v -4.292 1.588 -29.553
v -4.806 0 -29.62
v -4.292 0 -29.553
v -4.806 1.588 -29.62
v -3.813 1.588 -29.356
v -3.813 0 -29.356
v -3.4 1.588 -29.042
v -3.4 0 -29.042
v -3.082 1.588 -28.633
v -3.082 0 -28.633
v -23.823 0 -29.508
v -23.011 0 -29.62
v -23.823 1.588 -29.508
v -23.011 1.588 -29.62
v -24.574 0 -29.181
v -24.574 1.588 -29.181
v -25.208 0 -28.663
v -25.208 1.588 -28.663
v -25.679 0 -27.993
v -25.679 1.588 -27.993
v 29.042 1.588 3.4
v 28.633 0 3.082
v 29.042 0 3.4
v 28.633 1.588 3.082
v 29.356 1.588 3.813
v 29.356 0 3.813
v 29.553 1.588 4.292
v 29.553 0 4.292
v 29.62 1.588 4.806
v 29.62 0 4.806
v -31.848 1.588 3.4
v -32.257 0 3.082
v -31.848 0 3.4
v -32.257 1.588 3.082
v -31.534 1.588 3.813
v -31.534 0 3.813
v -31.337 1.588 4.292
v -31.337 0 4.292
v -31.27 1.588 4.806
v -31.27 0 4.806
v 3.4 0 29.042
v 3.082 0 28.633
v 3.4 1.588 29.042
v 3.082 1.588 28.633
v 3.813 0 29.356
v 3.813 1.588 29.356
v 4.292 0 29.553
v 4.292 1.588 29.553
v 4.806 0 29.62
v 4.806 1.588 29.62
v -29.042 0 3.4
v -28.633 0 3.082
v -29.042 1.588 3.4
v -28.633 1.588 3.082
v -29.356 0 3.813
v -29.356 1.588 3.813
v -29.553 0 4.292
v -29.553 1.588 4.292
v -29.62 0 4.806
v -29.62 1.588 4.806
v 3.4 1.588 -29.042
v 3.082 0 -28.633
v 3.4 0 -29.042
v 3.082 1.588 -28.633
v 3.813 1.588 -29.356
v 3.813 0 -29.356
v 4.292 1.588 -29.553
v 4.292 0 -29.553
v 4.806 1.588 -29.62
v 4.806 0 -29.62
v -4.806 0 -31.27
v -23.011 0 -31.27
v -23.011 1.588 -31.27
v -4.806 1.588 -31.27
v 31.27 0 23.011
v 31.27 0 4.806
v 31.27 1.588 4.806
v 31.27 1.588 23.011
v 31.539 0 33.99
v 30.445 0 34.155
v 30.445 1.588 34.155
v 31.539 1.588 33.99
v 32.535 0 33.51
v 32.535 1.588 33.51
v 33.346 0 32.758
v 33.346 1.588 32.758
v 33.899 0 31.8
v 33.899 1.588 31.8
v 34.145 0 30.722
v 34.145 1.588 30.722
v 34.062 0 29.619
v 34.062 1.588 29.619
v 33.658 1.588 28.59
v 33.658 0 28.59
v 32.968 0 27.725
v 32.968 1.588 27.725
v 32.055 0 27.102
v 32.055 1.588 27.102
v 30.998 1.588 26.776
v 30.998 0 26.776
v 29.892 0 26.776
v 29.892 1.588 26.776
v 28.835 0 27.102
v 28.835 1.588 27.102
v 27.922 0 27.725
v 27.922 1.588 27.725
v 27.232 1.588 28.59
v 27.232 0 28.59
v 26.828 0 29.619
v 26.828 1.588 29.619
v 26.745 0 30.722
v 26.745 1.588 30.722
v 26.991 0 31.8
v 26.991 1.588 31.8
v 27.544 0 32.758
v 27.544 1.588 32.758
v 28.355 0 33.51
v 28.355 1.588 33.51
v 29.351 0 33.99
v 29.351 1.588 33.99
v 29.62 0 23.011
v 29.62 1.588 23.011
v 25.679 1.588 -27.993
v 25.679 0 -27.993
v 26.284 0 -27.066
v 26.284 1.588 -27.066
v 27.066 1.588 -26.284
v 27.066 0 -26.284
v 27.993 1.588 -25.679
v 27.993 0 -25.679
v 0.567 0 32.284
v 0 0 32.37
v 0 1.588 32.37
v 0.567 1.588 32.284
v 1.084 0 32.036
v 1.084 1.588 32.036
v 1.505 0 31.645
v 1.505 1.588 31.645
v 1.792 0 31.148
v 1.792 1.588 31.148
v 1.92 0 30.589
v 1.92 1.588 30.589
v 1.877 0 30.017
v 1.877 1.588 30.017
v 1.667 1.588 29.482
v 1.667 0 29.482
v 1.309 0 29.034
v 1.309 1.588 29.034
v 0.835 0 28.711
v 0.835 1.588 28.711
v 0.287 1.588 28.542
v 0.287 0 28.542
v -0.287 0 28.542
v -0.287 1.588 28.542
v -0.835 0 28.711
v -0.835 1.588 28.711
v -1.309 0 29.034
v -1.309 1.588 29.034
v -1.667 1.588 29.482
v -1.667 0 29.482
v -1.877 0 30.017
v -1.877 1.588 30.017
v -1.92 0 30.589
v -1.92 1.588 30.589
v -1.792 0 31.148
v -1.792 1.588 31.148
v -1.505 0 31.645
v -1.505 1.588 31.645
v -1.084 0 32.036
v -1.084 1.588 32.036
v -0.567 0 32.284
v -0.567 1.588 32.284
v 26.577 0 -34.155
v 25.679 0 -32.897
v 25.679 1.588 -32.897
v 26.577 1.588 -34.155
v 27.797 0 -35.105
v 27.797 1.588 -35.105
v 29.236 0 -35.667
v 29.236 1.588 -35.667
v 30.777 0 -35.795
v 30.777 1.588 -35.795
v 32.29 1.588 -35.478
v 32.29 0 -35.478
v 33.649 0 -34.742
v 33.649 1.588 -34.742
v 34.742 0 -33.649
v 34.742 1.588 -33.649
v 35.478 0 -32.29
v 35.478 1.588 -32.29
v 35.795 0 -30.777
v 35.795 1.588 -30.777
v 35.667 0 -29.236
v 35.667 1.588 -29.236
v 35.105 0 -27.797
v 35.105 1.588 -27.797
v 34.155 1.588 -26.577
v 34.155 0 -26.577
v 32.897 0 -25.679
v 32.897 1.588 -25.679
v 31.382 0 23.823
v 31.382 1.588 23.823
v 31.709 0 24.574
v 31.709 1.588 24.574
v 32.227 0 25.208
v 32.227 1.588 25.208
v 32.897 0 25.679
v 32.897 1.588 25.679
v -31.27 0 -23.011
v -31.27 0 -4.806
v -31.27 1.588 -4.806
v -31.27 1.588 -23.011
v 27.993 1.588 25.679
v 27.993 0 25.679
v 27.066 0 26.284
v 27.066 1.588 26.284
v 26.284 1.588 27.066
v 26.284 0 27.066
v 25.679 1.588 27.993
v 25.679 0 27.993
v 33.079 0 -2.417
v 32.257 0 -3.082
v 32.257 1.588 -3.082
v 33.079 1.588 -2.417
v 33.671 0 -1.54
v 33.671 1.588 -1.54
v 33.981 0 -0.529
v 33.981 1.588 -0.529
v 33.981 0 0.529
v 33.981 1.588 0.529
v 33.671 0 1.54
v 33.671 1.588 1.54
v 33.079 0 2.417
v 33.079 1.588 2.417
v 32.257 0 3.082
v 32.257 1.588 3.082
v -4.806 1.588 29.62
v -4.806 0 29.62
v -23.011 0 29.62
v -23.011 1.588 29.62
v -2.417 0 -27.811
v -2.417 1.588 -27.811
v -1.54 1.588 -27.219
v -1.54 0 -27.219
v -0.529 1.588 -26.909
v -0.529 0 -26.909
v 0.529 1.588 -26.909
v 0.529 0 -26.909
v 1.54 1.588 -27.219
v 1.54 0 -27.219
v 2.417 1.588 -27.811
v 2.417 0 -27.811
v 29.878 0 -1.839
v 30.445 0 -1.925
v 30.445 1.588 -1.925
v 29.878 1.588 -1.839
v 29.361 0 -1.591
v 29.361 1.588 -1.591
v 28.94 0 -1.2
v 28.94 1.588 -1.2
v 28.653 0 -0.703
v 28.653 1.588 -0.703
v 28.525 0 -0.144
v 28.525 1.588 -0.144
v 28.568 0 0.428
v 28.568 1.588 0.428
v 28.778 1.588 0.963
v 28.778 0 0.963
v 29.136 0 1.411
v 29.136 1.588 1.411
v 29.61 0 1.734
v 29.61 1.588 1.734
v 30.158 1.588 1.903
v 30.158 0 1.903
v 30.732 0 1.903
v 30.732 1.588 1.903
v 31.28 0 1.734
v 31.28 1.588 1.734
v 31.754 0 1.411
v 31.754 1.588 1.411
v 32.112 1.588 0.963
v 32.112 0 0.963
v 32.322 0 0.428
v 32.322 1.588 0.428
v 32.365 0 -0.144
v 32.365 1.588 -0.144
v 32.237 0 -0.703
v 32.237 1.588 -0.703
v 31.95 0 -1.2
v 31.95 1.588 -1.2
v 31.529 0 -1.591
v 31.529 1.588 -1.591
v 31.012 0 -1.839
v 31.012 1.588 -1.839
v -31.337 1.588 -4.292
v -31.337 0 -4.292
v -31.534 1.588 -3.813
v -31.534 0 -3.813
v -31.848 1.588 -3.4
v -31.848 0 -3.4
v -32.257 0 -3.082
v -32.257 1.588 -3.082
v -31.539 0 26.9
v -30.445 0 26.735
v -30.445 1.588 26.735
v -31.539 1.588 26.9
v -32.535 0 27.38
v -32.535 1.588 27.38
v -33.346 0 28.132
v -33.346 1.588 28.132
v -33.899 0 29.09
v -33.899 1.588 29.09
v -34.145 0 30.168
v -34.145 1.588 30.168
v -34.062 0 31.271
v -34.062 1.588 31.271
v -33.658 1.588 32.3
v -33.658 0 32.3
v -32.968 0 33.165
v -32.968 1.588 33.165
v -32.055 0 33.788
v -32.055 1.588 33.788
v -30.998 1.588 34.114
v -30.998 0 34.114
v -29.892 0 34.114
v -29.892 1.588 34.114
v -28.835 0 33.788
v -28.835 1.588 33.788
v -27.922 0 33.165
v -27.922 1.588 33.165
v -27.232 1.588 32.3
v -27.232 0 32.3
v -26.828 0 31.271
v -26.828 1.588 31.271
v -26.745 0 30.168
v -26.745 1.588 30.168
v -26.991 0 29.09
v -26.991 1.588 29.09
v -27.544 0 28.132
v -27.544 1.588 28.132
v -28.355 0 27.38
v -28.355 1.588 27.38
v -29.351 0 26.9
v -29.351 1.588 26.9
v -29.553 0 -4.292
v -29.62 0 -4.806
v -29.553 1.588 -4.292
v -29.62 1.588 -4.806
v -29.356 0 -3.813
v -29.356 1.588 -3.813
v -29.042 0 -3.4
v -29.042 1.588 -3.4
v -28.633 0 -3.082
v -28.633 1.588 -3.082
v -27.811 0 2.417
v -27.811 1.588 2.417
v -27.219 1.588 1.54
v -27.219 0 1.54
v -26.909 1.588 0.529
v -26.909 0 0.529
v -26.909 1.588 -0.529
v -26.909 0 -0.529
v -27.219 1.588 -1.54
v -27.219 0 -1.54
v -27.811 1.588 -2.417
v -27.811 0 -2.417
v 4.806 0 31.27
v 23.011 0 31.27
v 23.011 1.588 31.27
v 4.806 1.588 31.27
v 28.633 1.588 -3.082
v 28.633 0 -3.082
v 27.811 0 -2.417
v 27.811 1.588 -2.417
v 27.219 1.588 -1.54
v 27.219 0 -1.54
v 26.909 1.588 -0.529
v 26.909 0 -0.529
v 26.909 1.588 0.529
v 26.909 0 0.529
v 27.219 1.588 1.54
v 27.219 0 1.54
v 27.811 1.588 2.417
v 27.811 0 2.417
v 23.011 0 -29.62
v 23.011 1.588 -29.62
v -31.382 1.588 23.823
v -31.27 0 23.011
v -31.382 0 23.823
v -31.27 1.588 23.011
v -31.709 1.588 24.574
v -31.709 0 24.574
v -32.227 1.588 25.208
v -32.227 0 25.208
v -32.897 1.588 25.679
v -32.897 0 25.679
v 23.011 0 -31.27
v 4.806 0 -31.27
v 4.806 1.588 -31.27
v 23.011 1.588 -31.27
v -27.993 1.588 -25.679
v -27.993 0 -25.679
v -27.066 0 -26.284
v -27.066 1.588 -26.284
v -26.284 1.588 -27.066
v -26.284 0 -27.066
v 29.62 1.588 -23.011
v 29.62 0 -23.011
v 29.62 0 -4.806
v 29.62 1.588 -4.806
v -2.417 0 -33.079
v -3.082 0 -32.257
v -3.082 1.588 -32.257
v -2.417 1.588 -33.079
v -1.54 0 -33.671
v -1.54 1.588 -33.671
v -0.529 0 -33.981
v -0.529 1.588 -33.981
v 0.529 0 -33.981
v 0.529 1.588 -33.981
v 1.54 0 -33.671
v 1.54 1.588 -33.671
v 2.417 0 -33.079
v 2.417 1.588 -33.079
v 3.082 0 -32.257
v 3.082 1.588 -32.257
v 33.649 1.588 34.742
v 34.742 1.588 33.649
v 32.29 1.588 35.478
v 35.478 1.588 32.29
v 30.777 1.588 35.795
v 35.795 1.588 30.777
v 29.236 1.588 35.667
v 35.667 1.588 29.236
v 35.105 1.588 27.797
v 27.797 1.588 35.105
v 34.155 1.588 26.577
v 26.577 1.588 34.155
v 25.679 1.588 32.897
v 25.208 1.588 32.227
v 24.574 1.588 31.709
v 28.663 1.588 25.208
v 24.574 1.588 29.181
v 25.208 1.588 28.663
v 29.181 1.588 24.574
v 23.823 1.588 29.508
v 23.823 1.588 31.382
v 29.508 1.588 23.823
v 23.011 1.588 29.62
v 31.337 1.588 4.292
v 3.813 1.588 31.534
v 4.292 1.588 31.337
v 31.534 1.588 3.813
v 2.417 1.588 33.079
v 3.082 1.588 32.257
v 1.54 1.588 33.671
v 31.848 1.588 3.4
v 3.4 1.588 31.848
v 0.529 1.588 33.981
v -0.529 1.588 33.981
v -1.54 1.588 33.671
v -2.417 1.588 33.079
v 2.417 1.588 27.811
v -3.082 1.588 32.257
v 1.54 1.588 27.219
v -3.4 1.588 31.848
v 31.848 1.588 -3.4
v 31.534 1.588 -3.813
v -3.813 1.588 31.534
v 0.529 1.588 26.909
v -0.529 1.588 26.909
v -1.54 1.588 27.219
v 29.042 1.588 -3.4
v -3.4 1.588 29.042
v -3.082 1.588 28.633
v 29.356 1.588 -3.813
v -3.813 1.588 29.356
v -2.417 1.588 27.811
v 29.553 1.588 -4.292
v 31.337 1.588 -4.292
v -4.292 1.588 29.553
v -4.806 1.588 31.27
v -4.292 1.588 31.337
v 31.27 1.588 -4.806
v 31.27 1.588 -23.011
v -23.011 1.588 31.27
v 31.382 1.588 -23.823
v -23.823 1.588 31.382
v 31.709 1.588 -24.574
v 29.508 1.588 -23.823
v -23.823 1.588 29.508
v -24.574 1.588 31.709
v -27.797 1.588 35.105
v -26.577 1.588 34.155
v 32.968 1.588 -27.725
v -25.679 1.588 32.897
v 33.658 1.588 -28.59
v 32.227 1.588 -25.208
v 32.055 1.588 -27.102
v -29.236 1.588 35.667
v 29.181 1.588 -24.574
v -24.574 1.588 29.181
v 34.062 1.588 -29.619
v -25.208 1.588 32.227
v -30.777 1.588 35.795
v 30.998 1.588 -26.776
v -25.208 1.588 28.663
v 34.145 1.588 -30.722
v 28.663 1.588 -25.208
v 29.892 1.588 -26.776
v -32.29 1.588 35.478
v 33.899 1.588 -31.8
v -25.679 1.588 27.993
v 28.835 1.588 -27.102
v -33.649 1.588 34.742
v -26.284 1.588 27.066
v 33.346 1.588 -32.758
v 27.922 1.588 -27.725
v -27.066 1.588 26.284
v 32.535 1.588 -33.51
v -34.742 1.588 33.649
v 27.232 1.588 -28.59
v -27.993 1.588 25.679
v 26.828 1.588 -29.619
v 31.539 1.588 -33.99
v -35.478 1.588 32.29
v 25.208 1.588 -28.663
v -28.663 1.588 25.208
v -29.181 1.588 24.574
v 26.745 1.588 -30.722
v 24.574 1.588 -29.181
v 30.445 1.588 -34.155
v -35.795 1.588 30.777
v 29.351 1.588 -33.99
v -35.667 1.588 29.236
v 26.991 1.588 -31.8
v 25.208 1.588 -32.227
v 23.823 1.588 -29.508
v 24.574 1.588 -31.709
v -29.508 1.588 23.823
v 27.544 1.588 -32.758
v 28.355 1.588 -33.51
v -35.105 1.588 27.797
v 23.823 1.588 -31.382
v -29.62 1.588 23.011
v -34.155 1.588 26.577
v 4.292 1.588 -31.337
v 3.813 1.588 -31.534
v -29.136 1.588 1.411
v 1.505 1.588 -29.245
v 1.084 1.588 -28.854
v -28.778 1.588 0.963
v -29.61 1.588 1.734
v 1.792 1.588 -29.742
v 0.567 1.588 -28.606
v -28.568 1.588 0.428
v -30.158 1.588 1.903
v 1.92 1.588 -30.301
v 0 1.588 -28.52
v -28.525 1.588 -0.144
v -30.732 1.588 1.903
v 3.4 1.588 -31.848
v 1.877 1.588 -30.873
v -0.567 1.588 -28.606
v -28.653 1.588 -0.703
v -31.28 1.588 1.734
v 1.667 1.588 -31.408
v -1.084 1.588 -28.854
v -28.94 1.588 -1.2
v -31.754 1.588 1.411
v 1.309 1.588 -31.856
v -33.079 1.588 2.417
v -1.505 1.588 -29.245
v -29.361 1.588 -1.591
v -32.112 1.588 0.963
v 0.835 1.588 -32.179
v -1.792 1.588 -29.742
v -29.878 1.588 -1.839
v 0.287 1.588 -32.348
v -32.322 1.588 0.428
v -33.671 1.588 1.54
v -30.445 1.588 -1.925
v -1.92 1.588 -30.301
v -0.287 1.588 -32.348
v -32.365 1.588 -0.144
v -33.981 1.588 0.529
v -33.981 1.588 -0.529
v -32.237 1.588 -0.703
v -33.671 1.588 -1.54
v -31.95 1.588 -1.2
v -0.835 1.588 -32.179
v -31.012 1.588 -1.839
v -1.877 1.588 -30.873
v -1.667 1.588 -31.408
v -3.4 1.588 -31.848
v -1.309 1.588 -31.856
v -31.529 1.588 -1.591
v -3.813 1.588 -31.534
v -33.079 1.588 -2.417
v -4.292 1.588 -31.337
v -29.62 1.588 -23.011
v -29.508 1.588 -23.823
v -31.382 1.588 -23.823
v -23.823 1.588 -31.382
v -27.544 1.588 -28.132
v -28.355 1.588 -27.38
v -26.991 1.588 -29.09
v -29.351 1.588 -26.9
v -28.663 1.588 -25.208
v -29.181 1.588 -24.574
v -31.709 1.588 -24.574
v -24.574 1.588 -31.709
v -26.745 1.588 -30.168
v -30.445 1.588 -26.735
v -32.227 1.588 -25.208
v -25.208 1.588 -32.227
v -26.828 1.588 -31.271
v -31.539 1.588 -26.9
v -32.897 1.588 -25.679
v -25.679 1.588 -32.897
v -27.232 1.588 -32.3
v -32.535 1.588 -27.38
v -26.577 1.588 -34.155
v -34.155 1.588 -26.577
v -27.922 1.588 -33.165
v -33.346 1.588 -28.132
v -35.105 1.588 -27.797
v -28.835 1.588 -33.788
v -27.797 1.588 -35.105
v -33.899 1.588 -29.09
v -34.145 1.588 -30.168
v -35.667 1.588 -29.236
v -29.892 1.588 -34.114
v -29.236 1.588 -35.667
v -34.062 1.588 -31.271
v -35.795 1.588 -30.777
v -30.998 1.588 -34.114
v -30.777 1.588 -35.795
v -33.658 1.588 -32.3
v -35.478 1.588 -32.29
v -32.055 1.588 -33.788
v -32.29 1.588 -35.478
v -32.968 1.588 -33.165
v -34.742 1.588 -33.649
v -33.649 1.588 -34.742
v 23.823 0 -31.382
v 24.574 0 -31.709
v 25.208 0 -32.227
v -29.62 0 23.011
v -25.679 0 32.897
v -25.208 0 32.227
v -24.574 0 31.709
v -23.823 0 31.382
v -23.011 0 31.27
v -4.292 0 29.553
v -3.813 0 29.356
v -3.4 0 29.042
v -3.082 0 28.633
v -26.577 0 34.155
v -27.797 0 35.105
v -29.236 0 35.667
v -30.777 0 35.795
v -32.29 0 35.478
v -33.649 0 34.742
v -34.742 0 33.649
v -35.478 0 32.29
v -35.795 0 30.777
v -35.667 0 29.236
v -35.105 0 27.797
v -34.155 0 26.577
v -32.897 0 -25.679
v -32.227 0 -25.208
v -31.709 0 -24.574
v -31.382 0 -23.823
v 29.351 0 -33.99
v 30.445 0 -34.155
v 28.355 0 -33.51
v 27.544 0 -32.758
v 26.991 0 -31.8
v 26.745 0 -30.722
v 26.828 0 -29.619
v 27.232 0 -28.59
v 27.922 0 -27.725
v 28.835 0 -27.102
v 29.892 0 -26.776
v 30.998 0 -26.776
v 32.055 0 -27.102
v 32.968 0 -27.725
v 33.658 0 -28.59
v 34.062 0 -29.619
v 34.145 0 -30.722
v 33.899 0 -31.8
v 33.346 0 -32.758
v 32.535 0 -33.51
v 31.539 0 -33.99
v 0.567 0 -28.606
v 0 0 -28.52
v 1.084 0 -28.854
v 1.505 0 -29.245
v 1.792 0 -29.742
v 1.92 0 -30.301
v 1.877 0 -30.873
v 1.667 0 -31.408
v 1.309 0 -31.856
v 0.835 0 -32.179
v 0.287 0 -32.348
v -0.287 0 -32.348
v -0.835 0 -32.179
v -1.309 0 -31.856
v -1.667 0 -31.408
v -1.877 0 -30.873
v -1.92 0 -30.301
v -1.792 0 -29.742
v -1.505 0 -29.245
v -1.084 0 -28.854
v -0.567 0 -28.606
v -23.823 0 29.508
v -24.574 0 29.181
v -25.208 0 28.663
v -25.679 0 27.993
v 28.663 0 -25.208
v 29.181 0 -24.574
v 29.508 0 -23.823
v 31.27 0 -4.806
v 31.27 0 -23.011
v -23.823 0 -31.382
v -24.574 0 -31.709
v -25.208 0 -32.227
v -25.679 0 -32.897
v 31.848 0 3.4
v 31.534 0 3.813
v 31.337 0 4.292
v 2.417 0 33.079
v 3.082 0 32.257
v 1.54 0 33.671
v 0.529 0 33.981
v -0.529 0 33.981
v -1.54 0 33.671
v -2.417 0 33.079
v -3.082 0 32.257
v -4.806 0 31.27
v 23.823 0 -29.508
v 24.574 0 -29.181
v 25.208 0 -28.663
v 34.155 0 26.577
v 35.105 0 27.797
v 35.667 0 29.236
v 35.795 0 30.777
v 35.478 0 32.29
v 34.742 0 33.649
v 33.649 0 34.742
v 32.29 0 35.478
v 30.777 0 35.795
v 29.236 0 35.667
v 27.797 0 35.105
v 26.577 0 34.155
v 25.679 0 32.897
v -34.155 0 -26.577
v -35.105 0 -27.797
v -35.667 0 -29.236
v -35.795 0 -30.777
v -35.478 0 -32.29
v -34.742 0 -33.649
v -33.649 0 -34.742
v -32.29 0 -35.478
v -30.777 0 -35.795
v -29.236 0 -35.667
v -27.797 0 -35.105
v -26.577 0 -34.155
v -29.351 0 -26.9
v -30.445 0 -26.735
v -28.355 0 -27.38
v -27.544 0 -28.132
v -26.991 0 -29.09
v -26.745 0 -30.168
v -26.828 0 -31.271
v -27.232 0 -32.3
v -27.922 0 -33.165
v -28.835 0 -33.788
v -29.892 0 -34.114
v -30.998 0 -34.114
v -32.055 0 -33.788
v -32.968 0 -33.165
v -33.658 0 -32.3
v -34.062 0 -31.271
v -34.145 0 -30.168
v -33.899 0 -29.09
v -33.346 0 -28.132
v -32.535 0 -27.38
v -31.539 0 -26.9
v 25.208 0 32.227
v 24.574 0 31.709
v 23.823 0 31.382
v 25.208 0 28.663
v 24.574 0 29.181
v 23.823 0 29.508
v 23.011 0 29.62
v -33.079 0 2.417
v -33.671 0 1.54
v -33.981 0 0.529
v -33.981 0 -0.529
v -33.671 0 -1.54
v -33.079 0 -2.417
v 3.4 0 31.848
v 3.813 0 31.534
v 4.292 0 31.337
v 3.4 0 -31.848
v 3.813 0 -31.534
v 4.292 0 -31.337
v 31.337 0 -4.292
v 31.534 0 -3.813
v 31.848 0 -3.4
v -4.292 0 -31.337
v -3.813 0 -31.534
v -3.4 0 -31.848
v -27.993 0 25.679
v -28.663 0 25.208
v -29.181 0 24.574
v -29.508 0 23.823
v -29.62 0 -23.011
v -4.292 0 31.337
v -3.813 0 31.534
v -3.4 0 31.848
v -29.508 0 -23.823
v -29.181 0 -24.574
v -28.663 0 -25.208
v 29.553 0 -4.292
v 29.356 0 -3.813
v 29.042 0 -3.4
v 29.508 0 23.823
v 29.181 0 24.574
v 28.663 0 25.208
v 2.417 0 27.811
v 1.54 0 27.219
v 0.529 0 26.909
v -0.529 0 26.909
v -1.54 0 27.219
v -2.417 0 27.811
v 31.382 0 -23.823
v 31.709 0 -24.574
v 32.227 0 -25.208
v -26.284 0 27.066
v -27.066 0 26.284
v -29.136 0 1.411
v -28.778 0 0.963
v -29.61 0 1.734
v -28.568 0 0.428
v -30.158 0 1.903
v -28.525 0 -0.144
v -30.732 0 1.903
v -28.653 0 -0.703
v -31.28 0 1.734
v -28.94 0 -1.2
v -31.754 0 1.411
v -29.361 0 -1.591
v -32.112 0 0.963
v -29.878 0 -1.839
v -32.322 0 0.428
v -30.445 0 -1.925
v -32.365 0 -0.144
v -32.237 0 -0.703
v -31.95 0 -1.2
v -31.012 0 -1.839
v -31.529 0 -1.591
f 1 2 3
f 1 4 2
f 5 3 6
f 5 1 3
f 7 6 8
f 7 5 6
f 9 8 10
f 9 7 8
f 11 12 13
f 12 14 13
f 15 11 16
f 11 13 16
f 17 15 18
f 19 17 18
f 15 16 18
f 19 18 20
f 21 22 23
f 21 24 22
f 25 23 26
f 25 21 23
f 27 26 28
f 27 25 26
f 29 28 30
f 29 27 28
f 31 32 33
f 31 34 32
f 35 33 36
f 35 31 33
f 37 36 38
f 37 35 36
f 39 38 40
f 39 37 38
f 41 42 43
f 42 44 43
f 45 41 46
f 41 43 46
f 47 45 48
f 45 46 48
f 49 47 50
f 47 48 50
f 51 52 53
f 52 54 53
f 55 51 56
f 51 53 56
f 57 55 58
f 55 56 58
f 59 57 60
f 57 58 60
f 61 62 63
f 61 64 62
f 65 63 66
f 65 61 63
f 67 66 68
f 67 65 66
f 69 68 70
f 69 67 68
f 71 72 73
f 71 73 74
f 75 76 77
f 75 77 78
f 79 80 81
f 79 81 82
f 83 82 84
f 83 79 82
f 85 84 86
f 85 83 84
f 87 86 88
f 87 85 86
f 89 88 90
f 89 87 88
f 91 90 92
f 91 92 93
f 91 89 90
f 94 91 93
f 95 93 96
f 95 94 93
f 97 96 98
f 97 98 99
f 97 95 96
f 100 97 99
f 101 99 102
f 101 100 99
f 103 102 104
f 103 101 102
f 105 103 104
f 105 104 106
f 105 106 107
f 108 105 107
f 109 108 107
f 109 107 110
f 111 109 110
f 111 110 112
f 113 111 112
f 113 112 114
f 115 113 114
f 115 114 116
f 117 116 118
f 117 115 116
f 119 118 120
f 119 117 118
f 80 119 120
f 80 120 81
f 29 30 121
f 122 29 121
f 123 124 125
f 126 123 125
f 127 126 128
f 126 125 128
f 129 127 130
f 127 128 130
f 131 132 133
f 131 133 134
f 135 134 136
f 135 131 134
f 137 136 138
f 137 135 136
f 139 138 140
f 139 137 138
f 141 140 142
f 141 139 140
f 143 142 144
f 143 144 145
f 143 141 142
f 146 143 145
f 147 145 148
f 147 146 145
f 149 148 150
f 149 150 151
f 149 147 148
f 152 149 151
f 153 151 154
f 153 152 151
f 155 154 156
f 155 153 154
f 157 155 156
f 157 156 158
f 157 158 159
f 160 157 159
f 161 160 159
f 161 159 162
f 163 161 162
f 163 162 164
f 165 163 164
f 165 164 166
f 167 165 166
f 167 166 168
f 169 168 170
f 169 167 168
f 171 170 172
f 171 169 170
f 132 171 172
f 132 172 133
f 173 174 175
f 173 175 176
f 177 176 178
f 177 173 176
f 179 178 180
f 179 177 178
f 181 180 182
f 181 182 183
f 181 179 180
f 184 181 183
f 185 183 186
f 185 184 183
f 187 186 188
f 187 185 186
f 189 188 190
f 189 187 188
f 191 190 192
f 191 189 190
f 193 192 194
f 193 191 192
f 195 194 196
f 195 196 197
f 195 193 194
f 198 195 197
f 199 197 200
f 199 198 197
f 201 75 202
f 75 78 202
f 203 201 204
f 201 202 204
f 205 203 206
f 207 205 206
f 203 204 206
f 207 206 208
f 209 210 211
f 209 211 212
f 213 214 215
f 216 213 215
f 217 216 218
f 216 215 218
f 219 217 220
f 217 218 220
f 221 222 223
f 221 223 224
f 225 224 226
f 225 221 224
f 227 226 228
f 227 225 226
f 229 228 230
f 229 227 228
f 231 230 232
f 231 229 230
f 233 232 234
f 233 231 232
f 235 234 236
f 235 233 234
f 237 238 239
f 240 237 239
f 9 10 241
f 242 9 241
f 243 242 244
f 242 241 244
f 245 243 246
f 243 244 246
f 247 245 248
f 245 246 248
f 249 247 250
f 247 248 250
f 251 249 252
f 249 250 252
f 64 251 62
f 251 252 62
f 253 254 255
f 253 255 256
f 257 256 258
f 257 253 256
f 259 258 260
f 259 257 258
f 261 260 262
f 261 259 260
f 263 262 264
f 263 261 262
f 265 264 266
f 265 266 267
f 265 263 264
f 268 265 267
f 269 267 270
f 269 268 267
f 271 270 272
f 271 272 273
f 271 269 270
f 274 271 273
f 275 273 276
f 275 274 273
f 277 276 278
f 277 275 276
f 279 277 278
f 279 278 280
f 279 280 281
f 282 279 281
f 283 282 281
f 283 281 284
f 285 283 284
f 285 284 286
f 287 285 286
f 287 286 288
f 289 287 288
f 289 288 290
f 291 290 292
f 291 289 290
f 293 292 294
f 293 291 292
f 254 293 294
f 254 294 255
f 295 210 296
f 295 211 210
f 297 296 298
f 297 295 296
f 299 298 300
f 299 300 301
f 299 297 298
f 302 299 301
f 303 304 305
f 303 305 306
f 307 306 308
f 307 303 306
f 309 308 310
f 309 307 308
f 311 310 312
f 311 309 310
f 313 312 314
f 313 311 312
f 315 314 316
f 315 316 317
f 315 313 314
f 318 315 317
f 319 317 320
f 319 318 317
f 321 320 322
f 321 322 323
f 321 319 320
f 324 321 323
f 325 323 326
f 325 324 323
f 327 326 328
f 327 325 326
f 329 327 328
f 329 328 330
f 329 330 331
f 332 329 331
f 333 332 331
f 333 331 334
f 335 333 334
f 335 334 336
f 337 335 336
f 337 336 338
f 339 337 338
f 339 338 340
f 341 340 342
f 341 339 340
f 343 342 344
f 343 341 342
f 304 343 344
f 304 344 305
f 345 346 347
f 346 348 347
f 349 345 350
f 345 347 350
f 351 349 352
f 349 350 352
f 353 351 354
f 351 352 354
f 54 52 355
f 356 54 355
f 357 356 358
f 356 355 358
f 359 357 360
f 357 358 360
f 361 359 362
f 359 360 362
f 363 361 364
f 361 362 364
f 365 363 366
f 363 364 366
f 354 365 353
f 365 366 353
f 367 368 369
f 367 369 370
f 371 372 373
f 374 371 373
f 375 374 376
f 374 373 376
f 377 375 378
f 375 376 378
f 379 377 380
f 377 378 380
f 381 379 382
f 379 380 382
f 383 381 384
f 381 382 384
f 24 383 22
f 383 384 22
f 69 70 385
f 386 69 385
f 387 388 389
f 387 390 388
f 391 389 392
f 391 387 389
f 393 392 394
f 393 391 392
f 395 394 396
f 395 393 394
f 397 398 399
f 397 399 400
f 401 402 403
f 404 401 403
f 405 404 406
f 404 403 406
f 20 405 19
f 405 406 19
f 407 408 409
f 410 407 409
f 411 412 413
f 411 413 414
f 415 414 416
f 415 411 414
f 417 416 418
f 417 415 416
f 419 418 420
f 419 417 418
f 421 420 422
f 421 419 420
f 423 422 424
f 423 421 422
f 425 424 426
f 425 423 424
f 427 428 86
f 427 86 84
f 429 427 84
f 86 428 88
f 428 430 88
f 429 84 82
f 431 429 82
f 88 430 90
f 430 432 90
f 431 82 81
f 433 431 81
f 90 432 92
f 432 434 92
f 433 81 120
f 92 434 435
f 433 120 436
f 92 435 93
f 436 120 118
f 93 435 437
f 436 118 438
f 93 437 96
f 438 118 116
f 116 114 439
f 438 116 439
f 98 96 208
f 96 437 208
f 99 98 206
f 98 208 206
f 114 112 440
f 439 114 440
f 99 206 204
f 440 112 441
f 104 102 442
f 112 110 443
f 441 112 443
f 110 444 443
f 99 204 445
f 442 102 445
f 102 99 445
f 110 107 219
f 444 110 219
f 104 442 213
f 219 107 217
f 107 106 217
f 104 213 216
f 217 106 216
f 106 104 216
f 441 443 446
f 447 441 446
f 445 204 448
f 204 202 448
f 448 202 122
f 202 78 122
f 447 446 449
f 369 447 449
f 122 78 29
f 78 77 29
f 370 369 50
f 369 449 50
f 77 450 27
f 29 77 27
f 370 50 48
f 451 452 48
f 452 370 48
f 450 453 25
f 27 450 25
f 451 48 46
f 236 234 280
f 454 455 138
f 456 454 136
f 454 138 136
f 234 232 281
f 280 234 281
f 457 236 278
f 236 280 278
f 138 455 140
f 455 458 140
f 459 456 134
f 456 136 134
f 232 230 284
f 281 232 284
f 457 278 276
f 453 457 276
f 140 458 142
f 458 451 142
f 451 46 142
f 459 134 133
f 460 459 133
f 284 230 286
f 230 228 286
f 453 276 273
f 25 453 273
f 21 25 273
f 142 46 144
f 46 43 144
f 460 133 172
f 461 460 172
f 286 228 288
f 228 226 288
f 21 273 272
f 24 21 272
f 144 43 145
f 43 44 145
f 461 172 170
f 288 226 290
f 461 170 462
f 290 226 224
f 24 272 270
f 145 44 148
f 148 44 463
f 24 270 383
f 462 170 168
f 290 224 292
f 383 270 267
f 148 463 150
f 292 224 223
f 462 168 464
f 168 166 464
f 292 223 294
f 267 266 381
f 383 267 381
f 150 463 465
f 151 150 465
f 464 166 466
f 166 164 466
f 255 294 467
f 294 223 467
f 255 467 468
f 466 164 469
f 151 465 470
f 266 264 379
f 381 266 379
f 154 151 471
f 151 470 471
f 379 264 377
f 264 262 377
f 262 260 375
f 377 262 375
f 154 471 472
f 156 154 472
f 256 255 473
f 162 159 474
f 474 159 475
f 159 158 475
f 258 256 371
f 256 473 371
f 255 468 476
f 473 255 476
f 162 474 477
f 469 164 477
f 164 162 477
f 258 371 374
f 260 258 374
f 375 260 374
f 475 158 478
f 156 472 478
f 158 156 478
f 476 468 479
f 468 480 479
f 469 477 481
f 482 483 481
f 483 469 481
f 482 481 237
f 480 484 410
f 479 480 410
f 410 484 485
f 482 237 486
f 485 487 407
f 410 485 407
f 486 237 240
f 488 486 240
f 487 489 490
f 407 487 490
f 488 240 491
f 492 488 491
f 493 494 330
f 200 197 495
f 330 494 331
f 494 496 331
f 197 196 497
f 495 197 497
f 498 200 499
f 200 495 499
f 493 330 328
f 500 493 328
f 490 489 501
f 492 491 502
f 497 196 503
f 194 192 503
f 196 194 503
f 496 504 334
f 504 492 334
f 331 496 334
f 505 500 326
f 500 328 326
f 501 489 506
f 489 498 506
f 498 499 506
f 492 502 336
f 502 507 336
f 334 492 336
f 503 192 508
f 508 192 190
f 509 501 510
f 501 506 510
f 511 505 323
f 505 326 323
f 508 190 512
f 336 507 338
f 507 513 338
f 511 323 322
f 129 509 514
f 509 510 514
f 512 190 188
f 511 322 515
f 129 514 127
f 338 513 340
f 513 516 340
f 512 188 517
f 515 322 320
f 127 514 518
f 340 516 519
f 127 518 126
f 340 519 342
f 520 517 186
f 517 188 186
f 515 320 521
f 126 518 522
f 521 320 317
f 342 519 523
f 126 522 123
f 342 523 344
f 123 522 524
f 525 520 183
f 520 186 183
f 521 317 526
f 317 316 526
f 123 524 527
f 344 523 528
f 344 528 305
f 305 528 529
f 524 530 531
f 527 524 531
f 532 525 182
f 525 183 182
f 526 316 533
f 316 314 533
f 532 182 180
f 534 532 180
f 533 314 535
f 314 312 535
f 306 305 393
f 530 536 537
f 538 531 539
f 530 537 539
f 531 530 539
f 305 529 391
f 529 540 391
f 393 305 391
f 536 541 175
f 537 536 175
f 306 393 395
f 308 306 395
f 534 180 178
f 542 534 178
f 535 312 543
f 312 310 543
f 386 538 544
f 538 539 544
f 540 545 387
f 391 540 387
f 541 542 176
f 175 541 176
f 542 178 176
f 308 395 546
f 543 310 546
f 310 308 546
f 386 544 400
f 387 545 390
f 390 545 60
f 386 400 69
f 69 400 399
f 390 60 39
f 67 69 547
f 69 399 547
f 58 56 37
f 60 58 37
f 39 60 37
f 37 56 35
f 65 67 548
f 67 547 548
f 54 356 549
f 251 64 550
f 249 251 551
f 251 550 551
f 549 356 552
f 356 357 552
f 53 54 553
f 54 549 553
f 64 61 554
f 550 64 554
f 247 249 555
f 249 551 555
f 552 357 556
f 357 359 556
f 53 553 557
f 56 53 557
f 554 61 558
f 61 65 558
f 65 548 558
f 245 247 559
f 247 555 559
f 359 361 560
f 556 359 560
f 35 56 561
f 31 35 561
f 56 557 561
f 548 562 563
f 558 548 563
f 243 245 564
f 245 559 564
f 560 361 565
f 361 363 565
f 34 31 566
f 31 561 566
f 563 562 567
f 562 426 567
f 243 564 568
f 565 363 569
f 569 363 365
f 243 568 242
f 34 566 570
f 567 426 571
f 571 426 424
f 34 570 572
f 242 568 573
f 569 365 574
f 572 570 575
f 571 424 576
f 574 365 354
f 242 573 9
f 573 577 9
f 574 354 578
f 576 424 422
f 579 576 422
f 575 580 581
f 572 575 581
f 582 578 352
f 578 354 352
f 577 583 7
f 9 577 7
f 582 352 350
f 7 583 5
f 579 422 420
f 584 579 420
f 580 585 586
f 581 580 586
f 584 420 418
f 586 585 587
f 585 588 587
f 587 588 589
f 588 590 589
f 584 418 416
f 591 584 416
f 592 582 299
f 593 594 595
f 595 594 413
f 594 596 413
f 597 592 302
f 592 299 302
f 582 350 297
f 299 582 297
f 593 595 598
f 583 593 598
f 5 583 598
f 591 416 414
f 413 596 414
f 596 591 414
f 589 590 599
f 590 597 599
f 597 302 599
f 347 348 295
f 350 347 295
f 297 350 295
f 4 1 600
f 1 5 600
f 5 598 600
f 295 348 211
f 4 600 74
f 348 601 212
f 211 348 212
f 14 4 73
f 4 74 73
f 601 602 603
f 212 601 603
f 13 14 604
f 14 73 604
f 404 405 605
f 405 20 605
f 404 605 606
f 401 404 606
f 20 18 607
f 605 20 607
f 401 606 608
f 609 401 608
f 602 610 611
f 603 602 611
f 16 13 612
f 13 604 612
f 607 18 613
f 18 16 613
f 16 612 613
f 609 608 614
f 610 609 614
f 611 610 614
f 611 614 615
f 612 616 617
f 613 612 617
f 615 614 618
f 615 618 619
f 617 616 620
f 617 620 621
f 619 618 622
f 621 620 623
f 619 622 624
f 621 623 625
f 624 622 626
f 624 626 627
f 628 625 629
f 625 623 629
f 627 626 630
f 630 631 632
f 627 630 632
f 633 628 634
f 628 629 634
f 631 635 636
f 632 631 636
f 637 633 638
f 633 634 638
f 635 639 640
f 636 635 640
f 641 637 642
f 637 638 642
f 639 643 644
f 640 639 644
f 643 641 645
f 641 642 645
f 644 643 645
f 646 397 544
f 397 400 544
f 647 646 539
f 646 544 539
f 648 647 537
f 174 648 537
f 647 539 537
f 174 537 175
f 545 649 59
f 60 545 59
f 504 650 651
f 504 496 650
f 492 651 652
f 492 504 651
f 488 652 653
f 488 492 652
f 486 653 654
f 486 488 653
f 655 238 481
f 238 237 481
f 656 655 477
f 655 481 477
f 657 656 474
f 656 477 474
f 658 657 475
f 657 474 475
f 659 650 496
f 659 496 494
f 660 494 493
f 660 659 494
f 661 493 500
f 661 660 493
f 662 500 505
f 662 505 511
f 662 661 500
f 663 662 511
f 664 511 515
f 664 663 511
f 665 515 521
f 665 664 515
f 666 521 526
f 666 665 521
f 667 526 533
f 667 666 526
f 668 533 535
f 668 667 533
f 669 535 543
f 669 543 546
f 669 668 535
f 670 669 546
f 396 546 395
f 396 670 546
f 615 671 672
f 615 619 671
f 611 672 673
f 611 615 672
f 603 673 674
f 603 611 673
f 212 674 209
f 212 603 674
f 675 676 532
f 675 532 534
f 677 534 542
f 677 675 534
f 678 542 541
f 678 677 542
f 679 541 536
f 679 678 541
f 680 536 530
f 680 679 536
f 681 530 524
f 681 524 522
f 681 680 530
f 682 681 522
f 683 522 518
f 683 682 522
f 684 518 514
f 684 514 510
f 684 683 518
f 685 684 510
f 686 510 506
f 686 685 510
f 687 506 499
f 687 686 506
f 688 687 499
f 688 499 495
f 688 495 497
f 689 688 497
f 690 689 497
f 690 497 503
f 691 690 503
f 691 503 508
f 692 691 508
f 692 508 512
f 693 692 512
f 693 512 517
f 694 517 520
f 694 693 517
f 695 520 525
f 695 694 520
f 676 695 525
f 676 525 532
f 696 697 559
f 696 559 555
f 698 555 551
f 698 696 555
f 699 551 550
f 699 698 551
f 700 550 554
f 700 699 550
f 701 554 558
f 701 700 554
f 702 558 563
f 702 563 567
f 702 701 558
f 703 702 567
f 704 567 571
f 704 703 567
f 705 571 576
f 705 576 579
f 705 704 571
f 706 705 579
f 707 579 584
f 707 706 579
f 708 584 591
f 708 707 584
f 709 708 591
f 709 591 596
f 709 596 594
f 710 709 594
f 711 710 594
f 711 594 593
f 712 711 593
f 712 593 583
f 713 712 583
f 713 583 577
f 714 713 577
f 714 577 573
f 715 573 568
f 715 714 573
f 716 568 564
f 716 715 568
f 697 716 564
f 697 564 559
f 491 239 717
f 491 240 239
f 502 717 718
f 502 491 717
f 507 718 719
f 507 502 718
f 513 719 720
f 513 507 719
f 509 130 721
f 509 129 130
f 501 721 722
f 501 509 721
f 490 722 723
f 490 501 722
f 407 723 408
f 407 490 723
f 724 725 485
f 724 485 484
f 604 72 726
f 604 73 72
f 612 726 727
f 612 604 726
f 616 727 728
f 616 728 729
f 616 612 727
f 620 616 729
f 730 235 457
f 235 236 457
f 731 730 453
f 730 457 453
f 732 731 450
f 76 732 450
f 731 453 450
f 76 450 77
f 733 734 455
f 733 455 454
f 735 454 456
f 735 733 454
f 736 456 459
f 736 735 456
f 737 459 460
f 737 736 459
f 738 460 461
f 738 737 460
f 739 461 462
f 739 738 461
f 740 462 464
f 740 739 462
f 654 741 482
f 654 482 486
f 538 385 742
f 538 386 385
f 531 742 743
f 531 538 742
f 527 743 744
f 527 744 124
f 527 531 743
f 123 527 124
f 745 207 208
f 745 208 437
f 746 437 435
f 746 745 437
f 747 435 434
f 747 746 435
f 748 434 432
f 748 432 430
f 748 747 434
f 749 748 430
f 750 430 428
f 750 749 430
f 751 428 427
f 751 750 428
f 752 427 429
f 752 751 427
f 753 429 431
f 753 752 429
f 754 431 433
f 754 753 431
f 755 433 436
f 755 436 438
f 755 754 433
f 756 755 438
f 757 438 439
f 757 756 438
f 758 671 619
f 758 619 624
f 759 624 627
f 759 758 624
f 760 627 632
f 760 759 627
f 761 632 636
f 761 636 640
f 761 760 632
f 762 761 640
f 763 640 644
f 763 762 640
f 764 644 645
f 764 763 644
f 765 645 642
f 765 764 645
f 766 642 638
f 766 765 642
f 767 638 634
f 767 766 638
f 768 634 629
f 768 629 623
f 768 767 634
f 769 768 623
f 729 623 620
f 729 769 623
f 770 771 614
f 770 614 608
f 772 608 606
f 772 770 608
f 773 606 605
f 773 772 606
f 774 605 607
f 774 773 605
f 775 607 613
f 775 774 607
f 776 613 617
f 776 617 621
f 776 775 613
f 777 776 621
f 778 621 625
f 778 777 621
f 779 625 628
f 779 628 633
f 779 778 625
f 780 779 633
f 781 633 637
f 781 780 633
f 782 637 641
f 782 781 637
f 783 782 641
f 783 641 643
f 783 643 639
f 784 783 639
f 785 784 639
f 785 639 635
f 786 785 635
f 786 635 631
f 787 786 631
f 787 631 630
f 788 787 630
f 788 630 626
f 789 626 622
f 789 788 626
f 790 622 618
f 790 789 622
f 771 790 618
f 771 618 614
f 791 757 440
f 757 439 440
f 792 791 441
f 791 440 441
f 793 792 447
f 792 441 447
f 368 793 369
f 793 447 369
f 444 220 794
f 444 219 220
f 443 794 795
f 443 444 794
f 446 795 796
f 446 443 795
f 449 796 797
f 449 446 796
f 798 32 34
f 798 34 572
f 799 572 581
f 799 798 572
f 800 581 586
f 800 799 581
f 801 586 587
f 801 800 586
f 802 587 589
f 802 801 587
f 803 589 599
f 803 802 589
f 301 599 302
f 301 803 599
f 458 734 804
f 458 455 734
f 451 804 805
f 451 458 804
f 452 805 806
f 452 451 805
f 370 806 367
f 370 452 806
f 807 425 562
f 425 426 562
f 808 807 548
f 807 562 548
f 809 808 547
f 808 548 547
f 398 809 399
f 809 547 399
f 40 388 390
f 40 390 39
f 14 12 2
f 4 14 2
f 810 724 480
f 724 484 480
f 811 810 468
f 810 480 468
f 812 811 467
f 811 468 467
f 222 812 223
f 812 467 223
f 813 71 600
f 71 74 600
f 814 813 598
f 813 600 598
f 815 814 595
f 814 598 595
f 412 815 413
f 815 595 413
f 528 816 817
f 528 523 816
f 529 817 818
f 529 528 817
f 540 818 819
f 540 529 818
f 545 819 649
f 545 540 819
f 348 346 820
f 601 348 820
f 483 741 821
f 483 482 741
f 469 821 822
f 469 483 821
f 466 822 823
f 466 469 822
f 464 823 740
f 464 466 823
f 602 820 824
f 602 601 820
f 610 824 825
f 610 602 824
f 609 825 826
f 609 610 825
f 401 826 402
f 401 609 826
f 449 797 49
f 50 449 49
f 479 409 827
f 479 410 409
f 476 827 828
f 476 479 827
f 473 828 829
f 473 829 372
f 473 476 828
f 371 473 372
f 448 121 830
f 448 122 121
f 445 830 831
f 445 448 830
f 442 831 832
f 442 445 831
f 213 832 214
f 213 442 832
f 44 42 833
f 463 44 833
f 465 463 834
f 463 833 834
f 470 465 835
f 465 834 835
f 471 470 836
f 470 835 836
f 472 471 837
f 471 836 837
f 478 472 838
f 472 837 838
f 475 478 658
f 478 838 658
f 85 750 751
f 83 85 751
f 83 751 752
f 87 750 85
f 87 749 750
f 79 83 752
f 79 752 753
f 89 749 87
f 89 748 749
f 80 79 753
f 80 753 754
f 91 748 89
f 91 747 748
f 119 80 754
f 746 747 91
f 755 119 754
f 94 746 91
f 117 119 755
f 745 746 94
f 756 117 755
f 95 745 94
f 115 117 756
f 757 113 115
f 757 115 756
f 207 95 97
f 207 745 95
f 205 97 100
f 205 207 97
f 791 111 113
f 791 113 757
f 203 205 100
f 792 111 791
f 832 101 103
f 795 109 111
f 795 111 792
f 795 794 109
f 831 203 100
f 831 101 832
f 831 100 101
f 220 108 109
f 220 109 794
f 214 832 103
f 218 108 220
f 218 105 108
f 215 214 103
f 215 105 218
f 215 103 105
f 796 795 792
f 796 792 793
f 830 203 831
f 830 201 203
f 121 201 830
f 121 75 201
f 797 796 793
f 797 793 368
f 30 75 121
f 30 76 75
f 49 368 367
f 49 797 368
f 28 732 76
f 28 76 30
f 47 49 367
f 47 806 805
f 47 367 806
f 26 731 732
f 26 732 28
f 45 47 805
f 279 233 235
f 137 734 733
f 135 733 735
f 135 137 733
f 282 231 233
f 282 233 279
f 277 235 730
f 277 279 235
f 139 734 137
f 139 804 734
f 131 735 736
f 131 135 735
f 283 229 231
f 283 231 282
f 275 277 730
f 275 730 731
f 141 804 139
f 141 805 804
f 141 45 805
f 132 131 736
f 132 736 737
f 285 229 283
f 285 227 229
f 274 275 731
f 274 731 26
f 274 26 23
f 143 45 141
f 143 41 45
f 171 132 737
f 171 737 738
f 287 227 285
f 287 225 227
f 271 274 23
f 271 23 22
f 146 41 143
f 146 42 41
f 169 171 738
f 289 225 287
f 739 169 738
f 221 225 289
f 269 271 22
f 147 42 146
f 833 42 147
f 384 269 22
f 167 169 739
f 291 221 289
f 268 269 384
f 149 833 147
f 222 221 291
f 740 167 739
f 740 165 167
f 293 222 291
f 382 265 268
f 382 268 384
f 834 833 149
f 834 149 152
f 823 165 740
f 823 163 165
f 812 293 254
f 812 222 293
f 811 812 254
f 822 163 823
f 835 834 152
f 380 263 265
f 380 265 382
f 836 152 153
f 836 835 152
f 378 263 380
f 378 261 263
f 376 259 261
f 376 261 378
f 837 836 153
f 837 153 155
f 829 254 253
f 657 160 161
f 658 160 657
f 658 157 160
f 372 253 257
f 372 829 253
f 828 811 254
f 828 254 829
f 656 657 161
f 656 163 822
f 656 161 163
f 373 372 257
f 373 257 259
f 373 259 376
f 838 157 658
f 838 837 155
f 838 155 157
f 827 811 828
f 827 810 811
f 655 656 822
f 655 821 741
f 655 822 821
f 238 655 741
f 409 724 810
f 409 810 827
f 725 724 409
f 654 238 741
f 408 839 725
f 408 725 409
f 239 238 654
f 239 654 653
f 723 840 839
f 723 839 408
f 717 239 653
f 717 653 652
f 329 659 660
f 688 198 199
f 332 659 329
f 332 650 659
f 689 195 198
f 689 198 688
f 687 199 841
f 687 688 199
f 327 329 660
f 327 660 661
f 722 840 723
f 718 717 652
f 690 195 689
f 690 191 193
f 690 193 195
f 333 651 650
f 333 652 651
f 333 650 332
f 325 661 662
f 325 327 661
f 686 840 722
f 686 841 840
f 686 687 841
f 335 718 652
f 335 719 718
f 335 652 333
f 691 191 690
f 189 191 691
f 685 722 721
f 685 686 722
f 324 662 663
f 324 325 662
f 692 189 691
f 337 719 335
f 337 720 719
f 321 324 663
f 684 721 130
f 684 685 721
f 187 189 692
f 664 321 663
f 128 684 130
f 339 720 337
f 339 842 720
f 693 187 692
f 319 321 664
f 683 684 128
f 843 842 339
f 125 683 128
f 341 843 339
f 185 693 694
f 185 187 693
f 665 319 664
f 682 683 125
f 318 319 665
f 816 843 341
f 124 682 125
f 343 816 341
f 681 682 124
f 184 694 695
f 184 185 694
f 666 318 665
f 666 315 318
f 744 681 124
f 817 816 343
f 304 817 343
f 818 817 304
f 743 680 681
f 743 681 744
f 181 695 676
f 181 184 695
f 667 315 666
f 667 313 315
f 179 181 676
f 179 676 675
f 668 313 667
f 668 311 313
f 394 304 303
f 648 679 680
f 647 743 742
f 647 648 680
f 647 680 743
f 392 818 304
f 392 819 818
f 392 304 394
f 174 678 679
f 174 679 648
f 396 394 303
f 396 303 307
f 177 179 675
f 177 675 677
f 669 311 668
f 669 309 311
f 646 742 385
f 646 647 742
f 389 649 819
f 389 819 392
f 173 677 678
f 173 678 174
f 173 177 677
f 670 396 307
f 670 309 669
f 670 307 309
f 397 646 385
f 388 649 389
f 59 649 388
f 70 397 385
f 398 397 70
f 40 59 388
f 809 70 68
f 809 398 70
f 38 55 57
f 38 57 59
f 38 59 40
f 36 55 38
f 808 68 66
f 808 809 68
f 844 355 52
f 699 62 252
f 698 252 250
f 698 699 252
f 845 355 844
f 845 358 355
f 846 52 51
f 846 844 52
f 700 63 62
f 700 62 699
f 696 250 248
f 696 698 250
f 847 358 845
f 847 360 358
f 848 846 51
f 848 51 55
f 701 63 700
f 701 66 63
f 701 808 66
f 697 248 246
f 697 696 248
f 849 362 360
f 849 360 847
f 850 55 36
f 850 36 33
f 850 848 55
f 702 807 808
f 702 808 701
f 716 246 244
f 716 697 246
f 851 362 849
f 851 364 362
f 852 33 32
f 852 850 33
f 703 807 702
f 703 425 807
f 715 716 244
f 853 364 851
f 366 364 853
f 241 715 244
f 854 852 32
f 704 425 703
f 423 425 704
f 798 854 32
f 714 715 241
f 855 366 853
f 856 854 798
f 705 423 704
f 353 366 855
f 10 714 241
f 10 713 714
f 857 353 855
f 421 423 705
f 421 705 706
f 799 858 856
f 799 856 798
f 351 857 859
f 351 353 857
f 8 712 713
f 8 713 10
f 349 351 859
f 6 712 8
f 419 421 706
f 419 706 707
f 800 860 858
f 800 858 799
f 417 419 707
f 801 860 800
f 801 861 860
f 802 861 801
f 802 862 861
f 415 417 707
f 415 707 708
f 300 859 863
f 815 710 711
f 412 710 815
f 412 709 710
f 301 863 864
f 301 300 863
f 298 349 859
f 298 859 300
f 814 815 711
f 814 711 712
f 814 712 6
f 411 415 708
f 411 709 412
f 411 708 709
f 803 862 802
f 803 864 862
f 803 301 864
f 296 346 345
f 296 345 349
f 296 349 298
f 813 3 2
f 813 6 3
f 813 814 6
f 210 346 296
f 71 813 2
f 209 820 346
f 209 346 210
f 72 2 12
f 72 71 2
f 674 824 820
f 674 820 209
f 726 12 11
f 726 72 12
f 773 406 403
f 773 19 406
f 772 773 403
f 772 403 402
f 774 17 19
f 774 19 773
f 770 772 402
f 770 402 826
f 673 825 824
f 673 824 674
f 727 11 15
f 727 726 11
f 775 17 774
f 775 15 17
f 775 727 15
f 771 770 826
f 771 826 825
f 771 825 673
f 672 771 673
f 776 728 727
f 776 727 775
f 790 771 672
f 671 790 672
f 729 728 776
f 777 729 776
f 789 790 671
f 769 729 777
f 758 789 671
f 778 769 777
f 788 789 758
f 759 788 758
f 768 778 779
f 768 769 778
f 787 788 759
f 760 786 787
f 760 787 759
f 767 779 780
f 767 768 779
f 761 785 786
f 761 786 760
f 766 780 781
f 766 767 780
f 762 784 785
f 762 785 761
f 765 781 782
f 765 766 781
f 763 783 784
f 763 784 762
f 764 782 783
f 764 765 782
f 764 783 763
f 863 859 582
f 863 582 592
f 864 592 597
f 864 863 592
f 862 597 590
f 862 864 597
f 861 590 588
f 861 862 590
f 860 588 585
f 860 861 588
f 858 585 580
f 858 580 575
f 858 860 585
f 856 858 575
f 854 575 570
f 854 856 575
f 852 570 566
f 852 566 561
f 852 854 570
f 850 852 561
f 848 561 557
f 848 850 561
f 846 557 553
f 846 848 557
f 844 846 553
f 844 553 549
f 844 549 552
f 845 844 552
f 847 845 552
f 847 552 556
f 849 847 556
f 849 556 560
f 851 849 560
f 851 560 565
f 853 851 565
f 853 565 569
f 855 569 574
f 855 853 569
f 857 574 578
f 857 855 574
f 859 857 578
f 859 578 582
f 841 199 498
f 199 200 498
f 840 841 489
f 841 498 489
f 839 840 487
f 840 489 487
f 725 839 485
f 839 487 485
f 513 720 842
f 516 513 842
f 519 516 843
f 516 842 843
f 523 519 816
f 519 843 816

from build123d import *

# Parameters (mm, degrees)
SKETCH1_R           = 3.71
SKETCH1_R_2         = 1.925
BOSS_EXTRUDE1_DEPTH = 1.5875
FILLET3_R           = 3
FILLET4_R           = 2


with BuildPart() as part:
    # Sketch1 → Boss-Extrude1 (new body)
    with BuildSketch(Plane(origin=(0, 0, 0), x_dir=(1, 0, 0), z_dir=(0, 1, 0))):
        with BuildLine():
            Line((-25.148871697, 31.27), (-3.478505426, 31.27))
            ThreePointArc((-3.478505426, 31.27), (0, 34.02), (3.478505426, 31.27))
            Line((3.478505426, 31.27), (25.148871697, 31.27))
            ThreePointArc((25.148871697, 31.27), (34.235092347, 34.235092347), (31.27, 25.148871697))
            Line((31.27, 25.148871697), (31.27, 3.478505426))
            ThreePointArc((31.27, 3.478505426), (34.02, 0), (31.27, -3.478505426))
            Line((31.27, -3.478505426), (31.27, -25.148871697))
            ThreePointArc((31.27, -25.148871697), (34.235092347, -34.235092347), (25.148871697, -31.27))
            Line((25.148871697, -31.27), (3.478505426, -31.27))
            ThreePointArc((3.478505426, -31.27), (0, -34.02), (-3.478505426, -31.27))
            Line((-3.478505426, -31.27), (-25.148871697, -31.27))
            ThreePointArc((-25.148871697, -31.27), (-34.235092347, -34.235092347), (-31.27, -25.148871697))
            Line((-31.27, -25.148871697), (-31.27, -3.478505426))
            ThreePointArc((-31.27, -3.478505426), (-34.02, 0), (-31.27, 3.478505426))
            Line((-31.27, 3.478505426), (-31.27, 25.148871697))
            ThreePointArc((-31.27, 25.148871697), (-34.235092347, 34.235092347), (-25.148871697, 31.27))
        make_face()
        with Locations(Location((-30.445, 30.445, 0), (0, 0, 270))):
            Circle(SKETCH1_R, mode=Mode.SUBTRACT)
        with Locations(Location((30.445, 30.445, 0), (0, 0, 90))):
            Circle(SKETCH1_R, mode=Mode.SUBTRACT)
        with Locations(Location((30.445, -30.445, 0), (0, 0, 270))):
            Circle(SKETCH1_R, mode=Mode.SUBTRACT)
        with Locations(Location((-30.445, -30.445, 0), (0, 0, 90))):
            Circle(SKETCH1_R, mode=Mode.SUBTRACT)
        with Locations(Location((0, 30.445, 0), (0, 0, 270))):
            Circle(SKETCH1_R_2, mode=Mode.SUBTRACT)
        with Locations(Location((-30.445, 0, 0), (0, 0, 90))):
            Circle(SKETCH1_R_2, mode=Mode.SUBTRACT)
        with Locations(Location((0, -30.445, 0), (0, 0, 270))):
            Circle(SKETCH1_R_2, mode=Mode.SUBTRACT)
        with Locations(Location((30.445, 0, 0), (0, 0, 90))):
            Circle(SKETCH1_R_2, mode=Mode.SUBTRACT)
        with BuildLine():
            Line((-25.148871697, 29.62), (-3.478505426, 29.62))
            ThreePointArc((-3.478505426, 29.62), (0, 26.87), (3.478505426, 29.62))
            Line((3.478505426, 29.62), (25.148871697, 29.62))
            ThreePointArc((25.148871697, 29.62), (26.654907653, 26.654907653), (29.62, 25.148871697))
            Line((29.62, 25.148871697), (29.62, 3.478505426))
            ThreePointArc((29.62, 3.478505426), (26.87, 0), (29.62, -3.478505426))
            Line((29.62, -3.478505426), (29.62, -25.148871697))
            ThreePointArc((29.62, -25.148871697), (26.654907653, -26.654907653), (25.148871697, -29.62))
            Line((25.148871697, -29.62), (3.478505426, -29.62))
            ThreePointArc((3.478505426, -29.62), (0, -26.87), (-3.478505426, -29.62))
            Line((-3.478505426, -29.62), (-25.148871697, -29.62))
            ThreePointArc((-25.148871697, -29.62), (-26.654907653, -26.654907653), (-29.62, -25.148871697))
            Line((-29.62, -25.148871697), (-29.62, -3.478505426))
            ThreePointArc((-29.62, -3.478505426), (-26.87, 0), (-29.62, 3.478505426))
            Line((-29.62, 3.478505426), (-29.62, 25.148871697))
            ThreePointArc((-29.62, 25.148871697), (-26.654907653, 26.654907653), (-25.148871697, 29.62))
        make_face(mode=Mode.SUBTRACT)
    extrude(amount=BOSS_EXTRUDE1_DEPTH)

    # Fillet3
    fillet3_edges = [part.edges().sort_by_distance(p)[0] for p in [
        (-25.148871697, 0.79375, -31.27),
        (25.148871697, 0.79375, -31.27),
        (31.27, 0.79375, -25.148871697),
        (31.27, 0.79375, 25.148871697),
        (25.148871697, 0.79375, 31.27),
        (-25.148871697, 0.79375, 31.27),
        (-31.27, 0.79375, 25.148871697),
        (-31.27, 0.79375, -25.148871697),
        (-25.148871697, 0.79375, -29.62),
        (-29.62, 0.79375, -25.148871697),
        (-29.62, 0.79375, 25.148871697),
        (-25.148871697, 0.79375, 29.62),
        (25.148871697, 0.79375, 29.62),
        (29.62, 0.79375, 25.148871697),
        (29.62, 0.79375, -25.148871697),
        (25.148871697, 0.79375, -29.62),
    ]]
    fillet(fillet3_edges, radius=FILLET3_R)

    # Fillet4
    fillet4_edges = [part.edges().sort_by_distance(p)[0] for p in [
        (-3.478505426, 0.79375, -31.27),
        (3.478505426, 0.79375, -31.27),
        (31.27, 0.79375, -3.478505426),
        (31.27, 0.79375, 3.478505426),
        (3.478505426, 0.79375, 31.27),
        (-3.478505426, 0.79375, 31.27),
        (-31.27, 0.79375, 3.478505426),
        (-31.27, 0.79375, -3.478505426),
        (-29.62, 0.79375, -3.478505426),
        (-29.62, 0.79375, 3.478505426),
        (-3.478505426, 0.79375, 29.62),
        (3.478505426, 0.79375, 29.62),
        (29.62, 0.79375, 3.478505426),
        (29.62, 0.79375, -3.478505426),
        (3.478505426, 0.79375, -29.62),
        (-3.478505426, 0.79375, -29.62),
    ]]
    fillet(fillet4_edges, radius=FILLET4_R)


solid = part.part
